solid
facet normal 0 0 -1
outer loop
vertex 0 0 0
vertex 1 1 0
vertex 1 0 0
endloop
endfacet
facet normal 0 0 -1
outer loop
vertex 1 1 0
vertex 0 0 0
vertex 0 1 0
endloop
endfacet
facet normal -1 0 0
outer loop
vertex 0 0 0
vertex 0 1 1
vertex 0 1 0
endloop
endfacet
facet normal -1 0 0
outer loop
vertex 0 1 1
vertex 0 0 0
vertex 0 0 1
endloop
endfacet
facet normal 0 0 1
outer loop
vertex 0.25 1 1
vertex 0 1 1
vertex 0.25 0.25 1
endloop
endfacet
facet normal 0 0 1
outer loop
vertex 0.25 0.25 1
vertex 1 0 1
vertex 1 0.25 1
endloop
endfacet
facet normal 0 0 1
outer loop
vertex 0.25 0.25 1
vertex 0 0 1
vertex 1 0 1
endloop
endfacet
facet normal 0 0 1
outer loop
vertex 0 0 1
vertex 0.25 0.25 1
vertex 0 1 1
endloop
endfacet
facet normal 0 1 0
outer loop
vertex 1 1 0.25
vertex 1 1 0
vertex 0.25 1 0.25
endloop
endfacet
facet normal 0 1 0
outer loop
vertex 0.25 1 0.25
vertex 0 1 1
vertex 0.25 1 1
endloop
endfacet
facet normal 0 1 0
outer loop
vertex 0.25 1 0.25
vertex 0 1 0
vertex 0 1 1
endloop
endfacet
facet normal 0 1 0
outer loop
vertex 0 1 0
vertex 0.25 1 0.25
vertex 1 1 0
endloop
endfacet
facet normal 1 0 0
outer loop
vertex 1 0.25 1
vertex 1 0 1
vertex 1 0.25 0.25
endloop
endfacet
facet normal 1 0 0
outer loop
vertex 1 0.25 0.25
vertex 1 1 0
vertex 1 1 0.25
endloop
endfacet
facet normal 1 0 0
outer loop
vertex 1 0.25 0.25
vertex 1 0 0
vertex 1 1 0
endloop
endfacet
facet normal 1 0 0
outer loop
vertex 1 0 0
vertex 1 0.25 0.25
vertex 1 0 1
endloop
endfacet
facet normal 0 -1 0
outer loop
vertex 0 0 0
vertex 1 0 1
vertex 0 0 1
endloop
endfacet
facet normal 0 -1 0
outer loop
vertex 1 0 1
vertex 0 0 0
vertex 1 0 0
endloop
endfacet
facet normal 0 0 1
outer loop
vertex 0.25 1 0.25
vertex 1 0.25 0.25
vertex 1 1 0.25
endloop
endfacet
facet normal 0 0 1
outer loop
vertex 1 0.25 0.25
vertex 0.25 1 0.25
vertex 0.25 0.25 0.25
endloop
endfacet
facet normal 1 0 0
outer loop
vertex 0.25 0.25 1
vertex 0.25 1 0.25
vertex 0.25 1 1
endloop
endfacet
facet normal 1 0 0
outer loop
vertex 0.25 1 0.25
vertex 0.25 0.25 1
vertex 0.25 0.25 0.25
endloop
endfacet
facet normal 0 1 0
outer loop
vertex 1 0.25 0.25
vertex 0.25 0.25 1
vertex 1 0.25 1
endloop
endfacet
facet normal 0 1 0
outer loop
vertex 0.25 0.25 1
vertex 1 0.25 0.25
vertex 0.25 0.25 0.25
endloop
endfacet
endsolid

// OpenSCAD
difference() {
linear_extrude(height=1) square(size=1);

translate([.25, .25, .25]) linear_extrude(height=1) square(size=1);
}
